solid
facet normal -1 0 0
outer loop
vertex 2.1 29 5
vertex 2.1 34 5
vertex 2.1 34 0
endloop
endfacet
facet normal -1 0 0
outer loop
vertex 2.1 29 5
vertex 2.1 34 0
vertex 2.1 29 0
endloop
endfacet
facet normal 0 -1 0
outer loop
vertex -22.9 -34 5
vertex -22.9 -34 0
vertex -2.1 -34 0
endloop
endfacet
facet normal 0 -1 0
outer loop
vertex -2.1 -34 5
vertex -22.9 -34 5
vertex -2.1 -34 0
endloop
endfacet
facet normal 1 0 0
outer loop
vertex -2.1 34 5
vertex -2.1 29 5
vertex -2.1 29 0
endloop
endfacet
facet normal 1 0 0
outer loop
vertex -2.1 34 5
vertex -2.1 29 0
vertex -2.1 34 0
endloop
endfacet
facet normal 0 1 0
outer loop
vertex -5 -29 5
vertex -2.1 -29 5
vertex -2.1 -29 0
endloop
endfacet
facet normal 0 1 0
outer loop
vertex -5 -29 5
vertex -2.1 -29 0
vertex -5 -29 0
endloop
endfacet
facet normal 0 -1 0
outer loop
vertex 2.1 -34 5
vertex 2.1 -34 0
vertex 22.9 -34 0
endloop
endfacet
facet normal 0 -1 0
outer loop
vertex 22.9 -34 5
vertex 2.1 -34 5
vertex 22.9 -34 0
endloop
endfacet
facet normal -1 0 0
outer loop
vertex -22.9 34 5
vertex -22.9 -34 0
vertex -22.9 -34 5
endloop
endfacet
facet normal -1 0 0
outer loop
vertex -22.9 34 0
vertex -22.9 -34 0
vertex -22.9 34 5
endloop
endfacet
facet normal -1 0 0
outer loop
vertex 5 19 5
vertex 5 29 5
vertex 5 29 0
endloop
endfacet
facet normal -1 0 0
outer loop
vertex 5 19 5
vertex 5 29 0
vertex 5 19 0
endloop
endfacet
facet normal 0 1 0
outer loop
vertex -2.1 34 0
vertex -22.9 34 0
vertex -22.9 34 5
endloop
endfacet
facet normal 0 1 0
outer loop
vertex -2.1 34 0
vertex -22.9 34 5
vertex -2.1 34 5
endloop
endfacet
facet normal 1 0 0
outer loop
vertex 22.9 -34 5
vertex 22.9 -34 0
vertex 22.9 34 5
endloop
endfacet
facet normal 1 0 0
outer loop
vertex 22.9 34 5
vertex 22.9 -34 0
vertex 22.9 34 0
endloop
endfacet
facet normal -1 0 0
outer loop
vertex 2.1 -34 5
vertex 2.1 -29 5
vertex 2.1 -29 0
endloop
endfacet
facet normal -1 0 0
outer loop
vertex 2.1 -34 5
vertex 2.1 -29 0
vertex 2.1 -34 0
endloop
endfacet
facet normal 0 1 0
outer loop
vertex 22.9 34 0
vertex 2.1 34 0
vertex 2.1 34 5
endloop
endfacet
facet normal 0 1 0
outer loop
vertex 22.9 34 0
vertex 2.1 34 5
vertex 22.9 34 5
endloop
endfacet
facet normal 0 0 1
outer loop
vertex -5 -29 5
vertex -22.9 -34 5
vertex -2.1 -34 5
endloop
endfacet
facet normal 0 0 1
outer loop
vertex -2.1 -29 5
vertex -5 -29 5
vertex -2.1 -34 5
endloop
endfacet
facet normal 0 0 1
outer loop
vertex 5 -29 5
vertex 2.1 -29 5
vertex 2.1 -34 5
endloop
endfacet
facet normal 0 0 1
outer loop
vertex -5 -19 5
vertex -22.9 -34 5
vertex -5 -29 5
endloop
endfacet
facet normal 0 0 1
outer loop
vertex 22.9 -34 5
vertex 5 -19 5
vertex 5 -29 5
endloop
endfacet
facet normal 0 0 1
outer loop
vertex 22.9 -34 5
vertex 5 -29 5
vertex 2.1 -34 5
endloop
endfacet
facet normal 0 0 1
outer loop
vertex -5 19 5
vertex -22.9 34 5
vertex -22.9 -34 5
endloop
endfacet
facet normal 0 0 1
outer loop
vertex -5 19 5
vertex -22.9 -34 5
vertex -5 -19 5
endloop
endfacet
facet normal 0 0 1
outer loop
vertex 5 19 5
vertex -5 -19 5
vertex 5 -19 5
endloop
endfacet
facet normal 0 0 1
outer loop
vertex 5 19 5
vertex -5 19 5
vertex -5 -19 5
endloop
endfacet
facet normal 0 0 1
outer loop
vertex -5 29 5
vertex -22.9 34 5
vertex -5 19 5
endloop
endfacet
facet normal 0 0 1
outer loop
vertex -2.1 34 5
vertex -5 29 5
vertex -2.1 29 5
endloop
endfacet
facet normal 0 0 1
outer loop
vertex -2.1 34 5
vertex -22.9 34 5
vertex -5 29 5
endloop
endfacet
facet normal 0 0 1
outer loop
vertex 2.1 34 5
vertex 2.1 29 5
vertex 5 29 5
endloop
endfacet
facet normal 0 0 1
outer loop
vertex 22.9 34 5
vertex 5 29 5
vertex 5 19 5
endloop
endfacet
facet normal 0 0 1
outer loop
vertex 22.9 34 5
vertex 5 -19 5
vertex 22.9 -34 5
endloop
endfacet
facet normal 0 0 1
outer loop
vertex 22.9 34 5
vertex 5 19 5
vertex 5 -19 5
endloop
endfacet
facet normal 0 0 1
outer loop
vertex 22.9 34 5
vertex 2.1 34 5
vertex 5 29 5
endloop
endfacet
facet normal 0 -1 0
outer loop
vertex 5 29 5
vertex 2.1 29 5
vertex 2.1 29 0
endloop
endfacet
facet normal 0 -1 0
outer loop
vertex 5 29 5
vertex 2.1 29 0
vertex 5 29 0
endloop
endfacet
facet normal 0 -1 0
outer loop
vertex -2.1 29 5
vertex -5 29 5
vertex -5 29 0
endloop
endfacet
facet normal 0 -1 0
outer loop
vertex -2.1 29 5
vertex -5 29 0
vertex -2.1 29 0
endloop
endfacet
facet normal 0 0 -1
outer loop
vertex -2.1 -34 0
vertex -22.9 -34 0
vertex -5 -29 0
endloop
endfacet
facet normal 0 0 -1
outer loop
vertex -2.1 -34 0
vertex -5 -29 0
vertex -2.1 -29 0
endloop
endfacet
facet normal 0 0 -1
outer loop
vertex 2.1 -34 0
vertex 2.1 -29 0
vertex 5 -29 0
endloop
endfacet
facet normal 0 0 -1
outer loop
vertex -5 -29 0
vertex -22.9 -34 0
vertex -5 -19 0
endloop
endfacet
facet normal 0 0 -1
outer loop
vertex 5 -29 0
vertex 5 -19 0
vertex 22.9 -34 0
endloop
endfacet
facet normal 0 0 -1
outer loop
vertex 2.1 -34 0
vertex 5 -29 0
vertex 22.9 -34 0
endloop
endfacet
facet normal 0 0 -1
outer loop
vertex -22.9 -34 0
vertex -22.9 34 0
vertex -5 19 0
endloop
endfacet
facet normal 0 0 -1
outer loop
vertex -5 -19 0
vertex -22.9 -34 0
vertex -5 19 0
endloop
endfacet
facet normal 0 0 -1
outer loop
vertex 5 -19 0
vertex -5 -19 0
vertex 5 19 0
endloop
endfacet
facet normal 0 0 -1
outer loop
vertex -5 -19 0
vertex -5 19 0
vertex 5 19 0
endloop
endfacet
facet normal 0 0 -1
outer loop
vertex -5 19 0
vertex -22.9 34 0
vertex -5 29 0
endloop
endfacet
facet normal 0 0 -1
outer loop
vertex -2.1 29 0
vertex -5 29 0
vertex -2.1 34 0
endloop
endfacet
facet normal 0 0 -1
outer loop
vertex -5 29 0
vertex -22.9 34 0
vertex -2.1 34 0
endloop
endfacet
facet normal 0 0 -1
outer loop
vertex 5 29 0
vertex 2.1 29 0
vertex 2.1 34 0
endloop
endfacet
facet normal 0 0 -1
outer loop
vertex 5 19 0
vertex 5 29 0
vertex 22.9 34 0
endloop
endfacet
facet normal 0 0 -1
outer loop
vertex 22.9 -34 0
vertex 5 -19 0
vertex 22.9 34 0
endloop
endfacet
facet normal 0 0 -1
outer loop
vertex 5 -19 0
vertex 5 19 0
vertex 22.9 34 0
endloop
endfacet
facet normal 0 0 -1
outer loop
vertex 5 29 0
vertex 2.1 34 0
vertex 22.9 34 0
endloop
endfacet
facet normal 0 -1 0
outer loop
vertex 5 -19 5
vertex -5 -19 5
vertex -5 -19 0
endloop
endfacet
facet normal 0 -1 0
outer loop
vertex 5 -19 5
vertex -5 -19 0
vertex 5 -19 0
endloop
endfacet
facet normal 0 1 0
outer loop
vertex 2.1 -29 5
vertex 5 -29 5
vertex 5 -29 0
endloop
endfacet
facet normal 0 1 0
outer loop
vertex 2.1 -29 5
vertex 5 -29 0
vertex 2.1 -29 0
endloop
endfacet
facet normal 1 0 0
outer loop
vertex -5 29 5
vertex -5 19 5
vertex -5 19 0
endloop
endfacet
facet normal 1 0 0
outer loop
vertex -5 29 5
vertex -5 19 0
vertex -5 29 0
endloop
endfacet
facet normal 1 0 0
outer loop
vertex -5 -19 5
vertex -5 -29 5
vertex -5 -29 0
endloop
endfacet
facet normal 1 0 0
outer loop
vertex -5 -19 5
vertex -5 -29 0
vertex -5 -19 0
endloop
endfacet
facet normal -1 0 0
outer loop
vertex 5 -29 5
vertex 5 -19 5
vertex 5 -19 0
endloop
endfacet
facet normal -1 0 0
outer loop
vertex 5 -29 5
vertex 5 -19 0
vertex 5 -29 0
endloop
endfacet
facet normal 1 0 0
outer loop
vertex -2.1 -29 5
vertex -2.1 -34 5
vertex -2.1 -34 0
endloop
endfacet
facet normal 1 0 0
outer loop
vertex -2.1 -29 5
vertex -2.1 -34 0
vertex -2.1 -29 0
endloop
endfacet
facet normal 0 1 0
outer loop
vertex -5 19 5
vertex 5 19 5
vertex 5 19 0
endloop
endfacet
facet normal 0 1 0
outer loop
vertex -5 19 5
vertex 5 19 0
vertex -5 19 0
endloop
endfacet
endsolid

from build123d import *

# Parameters (mm, degrees)
SKETCH1_W           = 45.8
SKETCH1_H           = 68
BOSS_EXTRUDE1_DEPTH = 5
CUT_EXTRUDE1_DEPTH  = 5


with BuildPart() as part:
    # Sketch1 → Boss-Extrude1 (new body)
    with BuildSketch(Plane.XY):
        Rectangle(SKETCH1_W, SKETCH1_H)
    extrude(amount=BOSS_EXTRUDE1_DEPTH)

    # Sketch2 → Cut-Extrude1 (cut)
    with BuildSketch(Plane.XY.offset(5)):
        Polygon((-2.1, 34), (2.1, 34), (2.1, 29), (5, 29), (5, 19), (-5, 19), (-5, 29), (-2.1, 29), align=None)
        Polygon((-2.1, -34), (-2.1, -29), (-5, -29), (-5, -19), (5, -19), (5, -29), (2.1, -29), (2.1, -34), align=None)
    extrude(amount=-CUT_EXTRUDE1_DEPTH, mode=Mode.SUBTRACT)


solid = part.part
